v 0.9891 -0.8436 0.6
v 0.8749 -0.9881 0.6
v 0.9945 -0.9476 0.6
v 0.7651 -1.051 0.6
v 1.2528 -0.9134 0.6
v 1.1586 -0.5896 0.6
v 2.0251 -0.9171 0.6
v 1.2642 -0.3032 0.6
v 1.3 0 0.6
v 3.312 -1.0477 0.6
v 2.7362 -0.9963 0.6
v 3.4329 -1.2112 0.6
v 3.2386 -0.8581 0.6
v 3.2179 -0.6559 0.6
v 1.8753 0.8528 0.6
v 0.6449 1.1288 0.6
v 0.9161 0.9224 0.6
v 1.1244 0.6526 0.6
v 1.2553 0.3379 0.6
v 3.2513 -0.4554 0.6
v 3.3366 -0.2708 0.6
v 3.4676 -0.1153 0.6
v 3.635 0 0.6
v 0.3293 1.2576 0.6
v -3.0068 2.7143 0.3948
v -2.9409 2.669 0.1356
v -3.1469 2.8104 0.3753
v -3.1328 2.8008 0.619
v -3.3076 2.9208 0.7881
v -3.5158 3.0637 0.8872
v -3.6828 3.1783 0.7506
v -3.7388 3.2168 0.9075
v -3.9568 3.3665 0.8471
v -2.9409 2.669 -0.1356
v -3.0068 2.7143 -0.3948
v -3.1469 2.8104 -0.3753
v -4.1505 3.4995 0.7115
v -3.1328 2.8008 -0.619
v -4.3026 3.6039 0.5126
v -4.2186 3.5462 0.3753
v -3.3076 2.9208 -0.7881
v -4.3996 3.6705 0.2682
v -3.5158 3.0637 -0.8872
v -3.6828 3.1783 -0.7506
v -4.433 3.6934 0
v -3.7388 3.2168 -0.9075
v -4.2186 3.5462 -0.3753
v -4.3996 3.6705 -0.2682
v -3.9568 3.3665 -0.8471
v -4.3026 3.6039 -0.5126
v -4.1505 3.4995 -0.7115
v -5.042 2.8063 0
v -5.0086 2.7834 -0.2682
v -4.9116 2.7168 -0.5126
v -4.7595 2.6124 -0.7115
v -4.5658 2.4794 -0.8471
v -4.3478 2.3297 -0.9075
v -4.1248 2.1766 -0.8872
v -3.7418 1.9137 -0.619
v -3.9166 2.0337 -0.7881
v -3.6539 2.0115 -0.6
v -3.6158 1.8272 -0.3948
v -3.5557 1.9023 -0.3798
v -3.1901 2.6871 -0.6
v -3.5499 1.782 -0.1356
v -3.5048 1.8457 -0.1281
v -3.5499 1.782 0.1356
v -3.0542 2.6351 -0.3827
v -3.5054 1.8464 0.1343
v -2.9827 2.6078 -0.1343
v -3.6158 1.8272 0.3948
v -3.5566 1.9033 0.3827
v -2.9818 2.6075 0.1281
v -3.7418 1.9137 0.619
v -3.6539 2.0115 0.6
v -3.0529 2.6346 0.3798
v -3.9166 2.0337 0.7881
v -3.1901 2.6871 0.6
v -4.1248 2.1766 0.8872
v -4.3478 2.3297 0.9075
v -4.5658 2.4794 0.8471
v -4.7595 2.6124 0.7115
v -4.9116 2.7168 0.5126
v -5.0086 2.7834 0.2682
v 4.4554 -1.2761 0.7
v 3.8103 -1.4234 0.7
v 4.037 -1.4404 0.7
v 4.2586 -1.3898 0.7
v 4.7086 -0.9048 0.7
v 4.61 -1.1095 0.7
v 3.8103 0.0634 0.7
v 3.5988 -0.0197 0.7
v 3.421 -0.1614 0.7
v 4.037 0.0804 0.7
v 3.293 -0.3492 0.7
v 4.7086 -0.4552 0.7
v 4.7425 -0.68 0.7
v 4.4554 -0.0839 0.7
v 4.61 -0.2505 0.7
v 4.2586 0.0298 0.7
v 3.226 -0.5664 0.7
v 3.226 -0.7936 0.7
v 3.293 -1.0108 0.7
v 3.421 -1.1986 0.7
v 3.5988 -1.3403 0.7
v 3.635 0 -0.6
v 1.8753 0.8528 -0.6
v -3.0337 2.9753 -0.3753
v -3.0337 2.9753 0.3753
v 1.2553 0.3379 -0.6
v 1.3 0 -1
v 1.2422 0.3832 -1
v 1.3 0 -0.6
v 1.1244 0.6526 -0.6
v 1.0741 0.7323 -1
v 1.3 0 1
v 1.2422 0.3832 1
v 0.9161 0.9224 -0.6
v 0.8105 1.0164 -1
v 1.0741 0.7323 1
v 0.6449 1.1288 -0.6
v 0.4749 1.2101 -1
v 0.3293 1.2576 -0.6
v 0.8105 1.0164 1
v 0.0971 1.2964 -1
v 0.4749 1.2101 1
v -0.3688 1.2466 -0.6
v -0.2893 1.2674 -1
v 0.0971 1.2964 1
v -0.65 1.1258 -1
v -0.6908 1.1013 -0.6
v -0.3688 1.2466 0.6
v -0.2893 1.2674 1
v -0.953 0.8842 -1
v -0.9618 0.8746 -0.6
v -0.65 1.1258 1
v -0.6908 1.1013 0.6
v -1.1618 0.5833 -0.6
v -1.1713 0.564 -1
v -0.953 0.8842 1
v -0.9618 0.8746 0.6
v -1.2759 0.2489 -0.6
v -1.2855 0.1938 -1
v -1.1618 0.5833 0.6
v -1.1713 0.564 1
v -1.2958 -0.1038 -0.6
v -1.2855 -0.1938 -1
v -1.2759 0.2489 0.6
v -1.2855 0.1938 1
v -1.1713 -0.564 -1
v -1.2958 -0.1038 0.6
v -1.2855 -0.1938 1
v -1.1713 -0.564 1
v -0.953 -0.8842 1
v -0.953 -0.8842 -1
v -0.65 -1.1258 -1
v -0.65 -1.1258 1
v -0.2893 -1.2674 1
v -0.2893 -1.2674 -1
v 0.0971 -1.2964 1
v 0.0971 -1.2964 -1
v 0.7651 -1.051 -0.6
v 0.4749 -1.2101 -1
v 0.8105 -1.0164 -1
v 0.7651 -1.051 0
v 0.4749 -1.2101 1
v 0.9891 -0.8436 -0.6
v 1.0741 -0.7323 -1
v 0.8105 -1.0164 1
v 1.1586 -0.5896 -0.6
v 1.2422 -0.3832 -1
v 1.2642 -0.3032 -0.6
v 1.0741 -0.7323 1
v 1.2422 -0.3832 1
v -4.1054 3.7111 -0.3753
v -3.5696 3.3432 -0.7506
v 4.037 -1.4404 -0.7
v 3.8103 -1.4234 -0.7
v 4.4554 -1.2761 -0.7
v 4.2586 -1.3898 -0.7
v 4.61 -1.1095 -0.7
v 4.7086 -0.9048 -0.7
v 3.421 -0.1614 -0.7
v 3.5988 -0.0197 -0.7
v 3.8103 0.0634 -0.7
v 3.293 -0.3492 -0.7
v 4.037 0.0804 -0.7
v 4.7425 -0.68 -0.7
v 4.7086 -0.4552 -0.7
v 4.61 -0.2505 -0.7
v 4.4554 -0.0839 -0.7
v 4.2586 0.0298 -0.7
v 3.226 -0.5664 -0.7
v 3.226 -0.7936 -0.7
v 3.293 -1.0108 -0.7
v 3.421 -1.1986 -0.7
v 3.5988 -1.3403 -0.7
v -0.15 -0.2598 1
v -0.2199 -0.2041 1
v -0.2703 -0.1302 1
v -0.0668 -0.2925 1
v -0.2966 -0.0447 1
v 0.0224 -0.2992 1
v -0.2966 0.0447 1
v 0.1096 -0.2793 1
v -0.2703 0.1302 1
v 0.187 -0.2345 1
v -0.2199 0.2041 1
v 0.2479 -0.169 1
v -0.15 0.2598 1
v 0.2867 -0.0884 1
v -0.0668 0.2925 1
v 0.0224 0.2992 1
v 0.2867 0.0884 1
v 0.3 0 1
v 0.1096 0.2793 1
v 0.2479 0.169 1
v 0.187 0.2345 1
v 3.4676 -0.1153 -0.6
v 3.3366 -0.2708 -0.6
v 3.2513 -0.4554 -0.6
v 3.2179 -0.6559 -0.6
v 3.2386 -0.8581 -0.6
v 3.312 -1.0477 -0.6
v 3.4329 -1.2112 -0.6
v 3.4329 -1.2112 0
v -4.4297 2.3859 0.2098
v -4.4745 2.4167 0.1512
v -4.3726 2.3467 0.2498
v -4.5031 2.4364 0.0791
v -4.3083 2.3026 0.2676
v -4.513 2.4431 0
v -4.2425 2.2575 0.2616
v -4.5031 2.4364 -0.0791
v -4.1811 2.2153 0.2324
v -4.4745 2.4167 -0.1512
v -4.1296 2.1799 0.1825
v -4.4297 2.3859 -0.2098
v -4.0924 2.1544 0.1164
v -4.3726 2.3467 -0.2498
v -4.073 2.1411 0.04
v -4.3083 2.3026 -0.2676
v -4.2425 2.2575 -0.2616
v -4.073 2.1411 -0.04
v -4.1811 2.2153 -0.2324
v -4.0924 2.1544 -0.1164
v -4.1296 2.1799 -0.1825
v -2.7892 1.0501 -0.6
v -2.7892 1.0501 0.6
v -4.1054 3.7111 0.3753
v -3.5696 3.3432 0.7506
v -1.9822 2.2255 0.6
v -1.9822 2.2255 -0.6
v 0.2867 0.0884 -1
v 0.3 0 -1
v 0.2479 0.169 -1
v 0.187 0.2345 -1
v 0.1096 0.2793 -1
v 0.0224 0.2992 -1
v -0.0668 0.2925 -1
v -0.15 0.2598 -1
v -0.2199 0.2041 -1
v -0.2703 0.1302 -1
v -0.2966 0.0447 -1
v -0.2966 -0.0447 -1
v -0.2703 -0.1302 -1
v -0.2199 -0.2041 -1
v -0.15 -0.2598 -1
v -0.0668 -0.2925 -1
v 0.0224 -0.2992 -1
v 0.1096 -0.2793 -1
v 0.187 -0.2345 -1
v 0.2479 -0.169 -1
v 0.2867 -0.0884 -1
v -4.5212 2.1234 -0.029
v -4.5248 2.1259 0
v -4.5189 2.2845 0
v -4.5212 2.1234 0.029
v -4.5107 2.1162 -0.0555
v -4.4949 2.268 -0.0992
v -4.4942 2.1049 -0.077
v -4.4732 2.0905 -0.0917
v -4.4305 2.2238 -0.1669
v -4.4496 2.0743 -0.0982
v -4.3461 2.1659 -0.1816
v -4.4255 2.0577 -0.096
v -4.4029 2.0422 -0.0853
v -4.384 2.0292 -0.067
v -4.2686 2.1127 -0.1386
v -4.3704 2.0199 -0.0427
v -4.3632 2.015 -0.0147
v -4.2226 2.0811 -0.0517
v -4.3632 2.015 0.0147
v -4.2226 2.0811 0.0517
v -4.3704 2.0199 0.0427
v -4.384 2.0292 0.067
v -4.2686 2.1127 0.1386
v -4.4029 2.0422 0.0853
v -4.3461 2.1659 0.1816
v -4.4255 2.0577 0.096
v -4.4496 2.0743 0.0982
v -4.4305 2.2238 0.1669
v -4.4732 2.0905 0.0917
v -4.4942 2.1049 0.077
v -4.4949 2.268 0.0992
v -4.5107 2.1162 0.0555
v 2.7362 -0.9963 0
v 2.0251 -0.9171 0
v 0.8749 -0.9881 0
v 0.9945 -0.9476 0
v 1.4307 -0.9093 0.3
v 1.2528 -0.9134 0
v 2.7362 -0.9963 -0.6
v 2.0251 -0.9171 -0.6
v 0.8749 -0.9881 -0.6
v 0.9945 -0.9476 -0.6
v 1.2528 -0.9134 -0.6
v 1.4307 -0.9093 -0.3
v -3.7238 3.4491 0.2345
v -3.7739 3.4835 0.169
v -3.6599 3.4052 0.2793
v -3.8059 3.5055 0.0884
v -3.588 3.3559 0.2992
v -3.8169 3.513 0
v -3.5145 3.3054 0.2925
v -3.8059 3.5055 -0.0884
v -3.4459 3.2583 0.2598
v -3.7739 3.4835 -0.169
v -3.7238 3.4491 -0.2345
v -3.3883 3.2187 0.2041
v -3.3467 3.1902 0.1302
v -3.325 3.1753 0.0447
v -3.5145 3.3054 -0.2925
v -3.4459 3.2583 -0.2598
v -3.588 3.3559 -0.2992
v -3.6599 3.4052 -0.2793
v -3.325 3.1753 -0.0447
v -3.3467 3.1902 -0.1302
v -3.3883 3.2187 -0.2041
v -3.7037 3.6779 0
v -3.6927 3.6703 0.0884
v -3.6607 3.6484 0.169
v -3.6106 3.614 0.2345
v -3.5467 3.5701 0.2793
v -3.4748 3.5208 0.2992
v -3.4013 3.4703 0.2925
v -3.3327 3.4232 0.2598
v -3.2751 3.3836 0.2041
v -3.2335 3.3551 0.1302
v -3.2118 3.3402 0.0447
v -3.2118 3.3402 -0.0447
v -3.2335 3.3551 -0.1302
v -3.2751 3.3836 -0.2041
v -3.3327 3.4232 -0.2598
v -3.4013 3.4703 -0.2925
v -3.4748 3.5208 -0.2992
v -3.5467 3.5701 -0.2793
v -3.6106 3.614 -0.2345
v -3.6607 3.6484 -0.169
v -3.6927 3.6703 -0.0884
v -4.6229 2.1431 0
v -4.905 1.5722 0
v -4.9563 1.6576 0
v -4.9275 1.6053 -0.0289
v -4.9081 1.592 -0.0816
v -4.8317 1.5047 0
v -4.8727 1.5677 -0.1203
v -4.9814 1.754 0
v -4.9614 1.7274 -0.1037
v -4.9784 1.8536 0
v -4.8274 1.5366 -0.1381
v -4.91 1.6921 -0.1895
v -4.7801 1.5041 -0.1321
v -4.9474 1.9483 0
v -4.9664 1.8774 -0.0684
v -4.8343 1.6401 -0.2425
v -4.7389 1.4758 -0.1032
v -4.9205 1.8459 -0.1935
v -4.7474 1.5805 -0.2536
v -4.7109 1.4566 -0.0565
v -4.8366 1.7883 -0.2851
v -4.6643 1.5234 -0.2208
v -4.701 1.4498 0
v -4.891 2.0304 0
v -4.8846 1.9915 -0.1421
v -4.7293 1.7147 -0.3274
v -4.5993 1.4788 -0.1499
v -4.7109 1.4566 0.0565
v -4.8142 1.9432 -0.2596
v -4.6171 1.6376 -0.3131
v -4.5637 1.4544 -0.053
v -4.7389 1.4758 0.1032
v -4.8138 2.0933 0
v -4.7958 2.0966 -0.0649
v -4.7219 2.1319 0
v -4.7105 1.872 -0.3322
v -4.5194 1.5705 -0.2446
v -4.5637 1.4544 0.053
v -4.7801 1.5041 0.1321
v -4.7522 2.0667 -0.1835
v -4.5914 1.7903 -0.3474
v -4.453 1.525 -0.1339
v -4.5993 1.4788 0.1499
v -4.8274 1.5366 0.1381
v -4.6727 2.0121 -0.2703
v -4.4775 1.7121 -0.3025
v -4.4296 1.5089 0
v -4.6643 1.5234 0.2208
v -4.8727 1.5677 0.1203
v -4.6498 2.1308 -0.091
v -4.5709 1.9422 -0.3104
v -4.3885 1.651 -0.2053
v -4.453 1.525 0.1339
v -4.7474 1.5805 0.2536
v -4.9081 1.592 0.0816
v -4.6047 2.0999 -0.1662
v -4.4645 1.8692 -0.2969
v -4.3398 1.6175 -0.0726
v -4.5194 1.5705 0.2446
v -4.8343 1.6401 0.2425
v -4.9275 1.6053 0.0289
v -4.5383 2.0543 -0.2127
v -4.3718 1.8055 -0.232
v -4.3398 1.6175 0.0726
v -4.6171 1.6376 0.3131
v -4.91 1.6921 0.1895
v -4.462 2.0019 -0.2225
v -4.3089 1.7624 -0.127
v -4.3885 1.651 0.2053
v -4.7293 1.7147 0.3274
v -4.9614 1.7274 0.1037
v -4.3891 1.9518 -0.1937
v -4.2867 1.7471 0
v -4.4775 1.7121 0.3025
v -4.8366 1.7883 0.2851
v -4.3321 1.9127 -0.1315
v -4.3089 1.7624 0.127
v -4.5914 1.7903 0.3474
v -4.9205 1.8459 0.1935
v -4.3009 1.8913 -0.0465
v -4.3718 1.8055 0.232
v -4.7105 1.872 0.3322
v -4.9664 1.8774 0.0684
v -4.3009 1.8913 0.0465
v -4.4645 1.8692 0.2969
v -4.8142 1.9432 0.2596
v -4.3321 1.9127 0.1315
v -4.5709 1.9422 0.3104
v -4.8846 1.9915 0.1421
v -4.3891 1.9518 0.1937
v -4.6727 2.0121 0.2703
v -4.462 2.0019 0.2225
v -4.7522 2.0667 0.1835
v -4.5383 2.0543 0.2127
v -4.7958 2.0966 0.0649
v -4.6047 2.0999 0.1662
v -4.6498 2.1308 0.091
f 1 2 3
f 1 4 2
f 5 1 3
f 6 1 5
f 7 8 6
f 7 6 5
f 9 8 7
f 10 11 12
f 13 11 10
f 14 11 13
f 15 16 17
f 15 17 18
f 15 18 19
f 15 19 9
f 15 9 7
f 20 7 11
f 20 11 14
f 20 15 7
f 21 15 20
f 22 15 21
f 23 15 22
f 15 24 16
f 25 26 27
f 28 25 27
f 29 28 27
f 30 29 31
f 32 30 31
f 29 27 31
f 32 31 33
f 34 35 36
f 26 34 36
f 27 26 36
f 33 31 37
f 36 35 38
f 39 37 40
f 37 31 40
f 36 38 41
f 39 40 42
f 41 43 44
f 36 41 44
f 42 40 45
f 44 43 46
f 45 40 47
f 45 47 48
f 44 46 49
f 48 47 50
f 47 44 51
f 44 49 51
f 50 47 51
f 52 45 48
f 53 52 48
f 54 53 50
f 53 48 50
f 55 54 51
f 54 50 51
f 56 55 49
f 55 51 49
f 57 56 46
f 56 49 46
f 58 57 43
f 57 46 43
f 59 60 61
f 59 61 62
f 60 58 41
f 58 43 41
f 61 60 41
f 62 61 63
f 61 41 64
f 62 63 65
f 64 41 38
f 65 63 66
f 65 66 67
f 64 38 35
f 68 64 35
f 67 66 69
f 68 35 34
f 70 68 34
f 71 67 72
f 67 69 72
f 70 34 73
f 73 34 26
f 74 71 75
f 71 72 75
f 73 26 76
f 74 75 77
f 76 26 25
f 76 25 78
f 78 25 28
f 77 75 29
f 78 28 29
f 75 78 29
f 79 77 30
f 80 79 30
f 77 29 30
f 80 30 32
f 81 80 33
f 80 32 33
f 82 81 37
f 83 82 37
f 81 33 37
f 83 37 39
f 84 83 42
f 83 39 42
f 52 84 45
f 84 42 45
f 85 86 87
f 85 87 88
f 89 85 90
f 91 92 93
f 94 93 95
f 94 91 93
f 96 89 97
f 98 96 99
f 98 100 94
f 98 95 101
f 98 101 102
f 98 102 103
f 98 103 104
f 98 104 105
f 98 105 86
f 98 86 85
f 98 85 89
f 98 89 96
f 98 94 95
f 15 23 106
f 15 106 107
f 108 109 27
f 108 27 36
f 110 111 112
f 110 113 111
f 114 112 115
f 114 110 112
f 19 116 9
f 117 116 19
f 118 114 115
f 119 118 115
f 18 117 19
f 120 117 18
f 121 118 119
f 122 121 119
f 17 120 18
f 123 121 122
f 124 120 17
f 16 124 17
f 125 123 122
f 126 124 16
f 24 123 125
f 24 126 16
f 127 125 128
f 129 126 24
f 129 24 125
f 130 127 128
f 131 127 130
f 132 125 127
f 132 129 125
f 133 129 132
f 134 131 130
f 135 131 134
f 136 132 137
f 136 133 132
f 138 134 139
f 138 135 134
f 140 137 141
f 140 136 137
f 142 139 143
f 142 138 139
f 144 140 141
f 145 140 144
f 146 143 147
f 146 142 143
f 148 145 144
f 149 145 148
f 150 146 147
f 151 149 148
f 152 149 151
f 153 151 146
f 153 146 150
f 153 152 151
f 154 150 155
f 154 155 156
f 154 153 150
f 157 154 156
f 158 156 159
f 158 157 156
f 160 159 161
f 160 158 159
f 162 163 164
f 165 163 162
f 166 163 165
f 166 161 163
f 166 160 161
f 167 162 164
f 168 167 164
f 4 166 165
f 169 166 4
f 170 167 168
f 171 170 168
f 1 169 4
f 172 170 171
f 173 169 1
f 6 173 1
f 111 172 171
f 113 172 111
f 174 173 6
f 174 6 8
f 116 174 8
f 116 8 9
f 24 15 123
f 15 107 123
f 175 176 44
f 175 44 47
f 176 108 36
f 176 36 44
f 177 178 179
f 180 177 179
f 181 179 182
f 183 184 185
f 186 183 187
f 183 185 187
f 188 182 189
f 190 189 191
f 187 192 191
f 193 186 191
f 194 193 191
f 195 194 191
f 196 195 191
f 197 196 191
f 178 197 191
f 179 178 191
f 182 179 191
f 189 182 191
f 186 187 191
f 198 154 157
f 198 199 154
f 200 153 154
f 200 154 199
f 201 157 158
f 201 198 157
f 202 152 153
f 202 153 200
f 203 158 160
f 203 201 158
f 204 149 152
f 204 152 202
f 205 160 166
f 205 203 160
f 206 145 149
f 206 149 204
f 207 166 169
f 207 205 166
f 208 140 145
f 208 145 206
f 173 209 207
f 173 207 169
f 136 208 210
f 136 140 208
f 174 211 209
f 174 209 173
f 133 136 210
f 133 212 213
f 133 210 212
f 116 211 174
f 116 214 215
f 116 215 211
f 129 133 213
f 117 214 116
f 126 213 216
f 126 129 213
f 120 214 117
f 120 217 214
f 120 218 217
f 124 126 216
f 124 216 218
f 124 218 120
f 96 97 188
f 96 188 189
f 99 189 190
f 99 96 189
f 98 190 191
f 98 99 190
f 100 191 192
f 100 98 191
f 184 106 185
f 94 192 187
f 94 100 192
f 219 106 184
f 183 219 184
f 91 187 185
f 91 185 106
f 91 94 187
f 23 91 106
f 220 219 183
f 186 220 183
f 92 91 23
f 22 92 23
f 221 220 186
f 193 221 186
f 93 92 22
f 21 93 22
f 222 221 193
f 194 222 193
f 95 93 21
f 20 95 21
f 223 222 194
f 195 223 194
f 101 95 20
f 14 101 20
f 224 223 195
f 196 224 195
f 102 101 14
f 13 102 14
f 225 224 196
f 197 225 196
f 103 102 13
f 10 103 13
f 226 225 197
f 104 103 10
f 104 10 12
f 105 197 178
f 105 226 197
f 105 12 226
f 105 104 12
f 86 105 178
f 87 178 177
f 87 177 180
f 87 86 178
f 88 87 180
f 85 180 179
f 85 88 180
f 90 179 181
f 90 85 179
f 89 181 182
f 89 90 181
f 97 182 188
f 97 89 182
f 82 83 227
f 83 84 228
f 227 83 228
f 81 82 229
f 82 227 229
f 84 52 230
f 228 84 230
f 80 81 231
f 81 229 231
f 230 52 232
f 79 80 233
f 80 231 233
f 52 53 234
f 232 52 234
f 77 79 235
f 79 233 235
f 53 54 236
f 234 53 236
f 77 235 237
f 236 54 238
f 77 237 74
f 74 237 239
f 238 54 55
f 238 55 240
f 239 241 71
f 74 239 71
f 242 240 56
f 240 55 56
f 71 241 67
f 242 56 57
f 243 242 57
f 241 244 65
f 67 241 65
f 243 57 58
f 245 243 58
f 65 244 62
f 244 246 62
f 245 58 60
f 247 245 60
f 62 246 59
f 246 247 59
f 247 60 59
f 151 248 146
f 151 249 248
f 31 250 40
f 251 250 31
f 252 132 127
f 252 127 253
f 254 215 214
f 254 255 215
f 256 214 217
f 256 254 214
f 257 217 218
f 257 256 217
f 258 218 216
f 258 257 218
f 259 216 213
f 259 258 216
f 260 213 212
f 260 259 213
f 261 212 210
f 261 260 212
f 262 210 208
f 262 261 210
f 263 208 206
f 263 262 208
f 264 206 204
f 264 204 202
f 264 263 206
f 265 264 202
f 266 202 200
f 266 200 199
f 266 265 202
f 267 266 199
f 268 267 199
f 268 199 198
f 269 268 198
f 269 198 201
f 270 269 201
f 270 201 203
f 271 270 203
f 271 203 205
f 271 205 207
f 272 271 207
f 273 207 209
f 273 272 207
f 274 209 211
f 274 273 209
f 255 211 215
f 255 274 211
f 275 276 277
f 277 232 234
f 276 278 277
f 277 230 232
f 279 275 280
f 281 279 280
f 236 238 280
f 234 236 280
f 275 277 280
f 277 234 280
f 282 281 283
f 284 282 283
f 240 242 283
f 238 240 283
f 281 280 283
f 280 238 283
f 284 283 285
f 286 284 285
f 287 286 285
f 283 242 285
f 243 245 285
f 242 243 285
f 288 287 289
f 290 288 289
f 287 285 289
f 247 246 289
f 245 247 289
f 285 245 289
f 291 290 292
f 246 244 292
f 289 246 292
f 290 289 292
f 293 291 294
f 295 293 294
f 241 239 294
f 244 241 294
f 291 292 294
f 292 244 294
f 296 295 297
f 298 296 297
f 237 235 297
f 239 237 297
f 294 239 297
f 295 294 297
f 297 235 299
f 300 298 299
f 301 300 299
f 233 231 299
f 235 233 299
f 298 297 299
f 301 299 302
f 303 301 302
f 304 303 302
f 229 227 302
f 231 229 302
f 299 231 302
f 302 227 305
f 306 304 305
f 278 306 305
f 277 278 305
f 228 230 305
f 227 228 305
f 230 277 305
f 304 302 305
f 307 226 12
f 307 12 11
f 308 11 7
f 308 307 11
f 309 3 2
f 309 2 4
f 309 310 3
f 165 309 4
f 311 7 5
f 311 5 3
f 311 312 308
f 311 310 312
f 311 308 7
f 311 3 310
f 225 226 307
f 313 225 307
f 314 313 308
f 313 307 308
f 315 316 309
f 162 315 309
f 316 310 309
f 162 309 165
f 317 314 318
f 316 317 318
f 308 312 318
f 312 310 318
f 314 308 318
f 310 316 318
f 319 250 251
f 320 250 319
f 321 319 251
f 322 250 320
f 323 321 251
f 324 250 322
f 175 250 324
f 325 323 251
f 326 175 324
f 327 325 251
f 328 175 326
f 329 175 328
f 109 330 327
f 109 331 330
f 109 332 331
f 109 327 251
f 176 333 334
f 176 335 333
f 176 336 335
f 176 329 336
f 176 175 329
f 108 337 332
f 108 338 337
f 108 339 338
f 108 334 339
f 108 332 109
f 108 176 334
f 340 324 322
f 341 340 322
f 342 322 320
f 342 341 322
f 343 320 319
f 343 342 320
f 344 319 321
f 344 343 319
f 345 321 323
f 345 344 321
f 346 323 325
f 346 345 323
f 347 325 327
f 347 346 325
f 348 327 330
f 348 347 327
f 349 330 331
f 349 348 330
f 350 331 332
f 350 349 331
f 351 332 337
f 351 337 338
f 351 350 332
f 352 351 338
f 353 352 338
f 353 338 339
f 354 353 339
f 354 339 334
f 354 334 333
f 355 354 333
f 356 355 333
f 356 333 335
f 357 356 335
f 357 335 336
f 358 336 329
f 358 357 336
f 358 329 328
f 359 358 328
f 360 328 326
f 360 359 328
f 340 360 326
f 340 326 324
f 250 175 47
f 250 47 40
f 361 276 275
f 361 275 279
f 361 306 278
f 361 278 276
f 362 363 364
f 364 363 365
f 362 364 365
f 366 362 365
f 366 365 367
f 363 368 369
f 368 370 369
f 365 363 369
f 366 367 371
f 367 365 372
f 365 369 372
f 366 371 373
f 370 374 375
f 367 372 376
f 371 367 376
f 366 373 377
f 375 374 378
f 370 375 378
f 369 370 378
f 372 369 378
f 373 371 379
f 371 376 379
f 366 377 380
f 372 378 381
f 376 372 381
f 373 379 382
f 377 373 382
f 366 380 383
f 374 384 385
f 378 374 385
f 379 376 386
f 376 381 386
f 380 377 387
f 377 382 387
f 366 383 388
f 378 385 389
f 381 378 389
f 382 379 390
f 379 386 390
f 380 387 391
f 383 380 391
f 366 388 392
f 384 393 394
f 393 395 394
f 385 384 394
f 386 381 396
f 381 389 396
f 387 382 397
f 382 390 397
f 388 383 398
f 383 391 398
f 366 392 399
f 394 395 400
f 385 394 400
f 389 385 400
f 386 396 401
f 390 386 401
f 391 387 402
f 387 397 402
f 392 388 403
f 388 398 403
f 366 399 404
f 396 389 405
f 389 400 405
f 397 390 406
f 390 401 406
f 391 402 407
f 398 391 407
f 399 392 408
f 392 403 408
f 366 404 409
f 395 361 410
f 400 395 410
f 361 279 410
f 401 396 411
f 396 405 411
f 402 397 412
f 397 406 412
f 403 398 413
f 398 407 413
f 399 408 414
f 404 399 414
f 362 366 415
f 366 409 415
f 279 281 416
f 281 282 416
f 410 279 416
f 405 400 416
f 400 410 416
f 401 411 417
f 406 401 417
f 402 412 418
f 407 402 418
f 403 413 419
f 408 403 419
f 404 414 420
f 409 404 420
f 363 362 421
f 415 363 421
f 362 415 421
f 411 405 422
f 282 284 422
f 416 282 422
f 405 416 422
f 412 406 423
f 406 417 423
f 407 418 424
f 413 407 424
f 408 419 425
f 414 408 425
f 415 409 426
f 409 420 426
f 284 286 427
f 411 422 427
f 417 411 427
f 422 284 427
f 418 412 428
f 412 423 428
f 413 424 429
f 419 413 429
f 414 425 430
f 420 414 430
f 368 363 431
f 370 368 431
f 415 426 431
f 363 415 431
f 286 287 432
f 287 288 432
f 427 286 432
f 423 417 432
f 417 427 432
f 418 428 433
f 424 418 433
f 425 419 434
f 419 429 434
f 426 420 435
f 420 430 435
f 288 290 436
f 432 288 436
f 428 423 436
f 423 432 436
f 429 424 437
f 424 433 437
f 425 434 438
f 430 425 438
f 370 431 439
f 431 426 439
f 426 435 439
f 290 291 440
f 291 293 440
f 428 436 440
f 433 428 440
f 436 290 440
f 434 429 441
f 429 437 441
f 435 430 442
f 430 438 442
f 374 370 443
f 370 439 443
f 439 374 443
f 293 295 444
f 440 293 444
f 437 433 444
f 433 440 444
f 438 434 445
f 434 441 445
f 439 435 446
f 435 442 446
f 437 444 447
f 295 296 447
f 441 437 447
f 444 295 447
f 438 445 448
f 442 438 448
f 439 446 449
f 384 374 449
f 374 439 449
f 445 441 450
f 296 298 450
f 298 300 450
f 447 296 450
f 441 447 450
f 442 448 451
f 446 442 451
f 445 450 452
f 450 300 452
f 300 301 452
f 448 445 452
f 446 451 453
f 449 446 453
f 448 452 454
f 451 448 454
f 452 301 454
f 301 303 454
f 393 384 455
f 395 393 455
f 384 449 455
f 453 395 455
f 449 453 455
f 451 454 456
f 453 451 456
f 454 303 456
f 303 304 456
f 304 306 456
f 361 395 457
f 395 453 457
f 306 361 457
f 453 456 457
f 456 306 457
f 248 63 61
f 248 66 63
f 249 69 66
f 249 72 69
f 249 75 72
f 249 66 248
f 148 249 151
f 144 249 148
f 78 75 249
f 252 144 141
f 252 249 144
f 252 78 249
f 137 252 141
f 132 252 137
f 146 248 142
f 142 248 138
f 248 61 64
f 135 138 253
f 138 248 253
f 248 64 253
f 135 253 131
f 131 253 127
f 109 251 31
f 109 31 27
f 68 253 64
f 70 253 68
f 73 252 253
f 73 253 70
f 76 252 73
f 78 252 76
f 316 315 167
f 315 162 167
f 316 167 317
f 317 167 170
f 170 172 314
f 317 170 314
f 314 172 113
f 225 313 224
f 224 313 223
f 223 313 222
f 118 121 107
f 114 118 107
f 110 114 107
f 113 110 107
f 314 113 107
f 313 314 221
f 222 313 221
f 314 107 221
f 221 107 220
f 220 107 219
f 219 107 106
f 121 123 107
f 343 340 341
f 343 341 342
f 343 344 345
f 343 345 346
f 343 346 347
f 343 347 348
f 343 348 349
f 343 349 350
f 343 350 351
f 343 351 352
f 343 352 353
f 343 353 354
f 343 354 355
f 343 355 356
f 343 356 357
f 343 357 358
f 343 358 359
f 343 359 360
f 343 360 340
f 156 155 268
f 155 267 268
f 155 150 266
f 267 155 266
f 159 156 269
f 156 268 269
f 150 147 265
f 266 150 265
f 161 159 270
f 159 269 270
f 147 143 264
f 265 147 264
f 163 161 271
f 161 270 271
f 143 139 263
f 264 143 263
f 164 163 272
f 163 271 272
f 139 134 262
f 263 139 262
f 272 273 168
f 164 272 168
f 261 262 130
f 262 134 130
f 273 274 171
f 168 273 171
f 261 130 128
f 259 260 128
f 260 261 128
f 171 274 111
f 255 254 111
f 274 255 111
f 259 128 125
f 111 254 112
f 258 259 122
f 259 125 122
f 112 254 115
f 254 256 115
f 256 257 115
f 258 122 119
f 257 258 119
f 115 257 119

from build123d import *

# Parameters (mm, degrees)
SKETCH1_R           = 0.3
BOSS_EXTRUDE1_DEPTH = 1
BOSS_EXTRUDE2_DEPTH = 0.7
BOSS_EXTRUDE3_DEPTH = 0.6
BOSS_EXTRUDE4_DEPTH = 0.6
BOSS_EXTRUDE5_DEPTH = 0.2
SKETCH5_R           = 0.3
BOSS_EXTRUDE6_DEPTH = 0.2


with BuildPart() as part:
    # Sketch1 → Boss-Extrude1 (new, symmetric)
    with BuildSketch(Plane.XY):
        with BuildLine():
            ThreePointArc((1.3, 0), (1.02910885, 0.794314153), (0.329330809, 1.257593423))
            ThreePointArc((0.329330809, 1.257593423), (-0.020477848, 1.299838705), (-0.368782161, 1.24659525))
            ThreePointArc((-0.368782161, 1.24659525), (-1.071749439, 0.735767042), (-1.295848634, -0.103809043))
            ThreePointArc((-1.295848634, -0.103809043), (-0.542880941, -1.181219829), (0.765101997, -1.051008532))
            ThreePointArc((0.765101997, -1.051008532), (1.158583747, -0.5896471), (1.3, 0))
        make_face()
        Circle(SKETCH1_R, mode=Mode.SUBTRACT)
    extrude(amount=BOSS_EXTRUDE1_DEPTH, both=True)



with BuildPart() as body_2:
    # Sketch1<3> → Boss-Extrude2 (new, symmetric)
    with BuildSketch(Plane.XY):
        with BuildLine():
            ThreePointArc((4.7425, -0.68), (4.378976485, -0.030212331), (3.635027175, 0))
            ThreePointArc((3.635027175, 0), (3.227898468, -0.554502849), (3.432931907, -1.211152286))
            ThreePointArc((3.432931907, -1.211152286), (4.266589278, -1.386592411), (4.7425, -0.68))
        make_face()
    extrude(amount=BOSS_EXTRUDE2_DEPTH, both=True)


with BuildPart() as part_1:
    add(part.part)

    add(body_2.part)  # Boss-Extrude3 merges body 2
    # Sketch1<4> → Boss-Extrude3 (add, symmetric)
    with BuildSketch(Plane.XY):
        with BuildLine():
            ThreePointArc((3.432931907, -1.211152286), (3.227898468, -0.554502849), (3.635027175, 0))
            Line((3.635027175, 0), (1.875255399, 0.852756227))
            Line((1.875255399, 0.852756227), (0.329330809, 1.257593423))
            ThreePointArc((0.329330809, 1.257593423), (1.02910885, 0.794314153), (1.3, 0))
            ThreePointArc((1.3, 0), (1.158583747, -0.5896471), (0.765101997, -1.051008532))
            add(Edge.make_bspline(
                [(3.432931907, -1.211152286), (2.782696134, -0.927463912), (1.92467005, -0.895659575), (0.949941147, -0.916451296), (0.765101997, -1.051008532)],
                knots=[0, 0, 0, 0, 0.749641012, 1, 1, 1, 1], degree=3))
        make_face()
    extrude(amount=BOSS_EXTRUDE3_DEPTH, both=True)

    # Sketch1<5> → Boss-Extrude4 (add, symmetric)
    with BuildSketch(Plane.XY):
        with BuildLine():
            ThreePointArc((-1.295848634, -0.103809043), (-1.071749439, 0.735767042), (-0.368782161, 1.24659525))
            Line((-0.368782161, 1.24659525), (-1.982194984, 2.225541153))
            Line((-1.982194984, 2.225541153), (-3.468005165, 2.793231136))
            Line((-3.468005165, 2.793231136), (-3.852867925, 2.232623737))
            Line((-3.852867925, 2.232623737), (-2.789177956, 1.050055575))
            Line((-2.789177956, 1.050055575), (-1.295848634, -0.103809043))
        make_face()
    extrude(amount=BOSS_EXTRUDE4_DEPTH, both=True)



with BuildPart() as body_2_2:
    # Sketch2 → Revolve1 (revolve)
    with BuildSketch(Plane.XY):
        with BuildLine():
            Line((-3.852867925, 2.232623737), (-3.445366179, 2.826208042))
            Line((-3.445366179, 2.826208042), (-3.771013124, 3.049768027))
            Line((-3.771013124, 3.049768027), (-4.831729785, 1.50468321))
            ThreePointArc((-4.831729785, 1.50468321), (-4.376188277, 1.556125039), (-4.362335635, 2.014352527))
            Line((-4.362335635, 2.014352527), (-3.852867925, 2.232623737))
        make_face()
    revolve(axis=Axis((-3.771013124, 3.049768027, 0), (-0.5659746478395028, -0.8244226452511788, 0)))


with BuildPart() as part_2:
    add(part_1.part)

    add(body_2_2.part)  # Revolve2 merges body 2 2
    # Sketch3 → Revolve2 (revolve)
    with BuildSketch(Plane.XY):
        Polygon((-3.682752686, 3.178331919), (-4.291741407, 2.291253153), (-5.041966015, 2.806290082), (-4.432977294, 3.693368848), align=None)
    revolve(axis=Axis((-3.682752686, 3.178331919, 0), (-0.5659746478395036, -0.8244226452511781, 0)))

    # Sketch4 → Boss-Extrude5 (add, symmetric)
    with BuildSketch(Plane(origin=(0.303330803, 0.441844497, 0), x_dir=(0.824422645251178, -0.5659746478395038, 0), z_dir=(0.5659746478395038, 0.824422645251178, 0))):
        Polygon((-4.835, 0.75055535), (-5.485, 0.375277675), (-5.485, -0.375277675), (-4.835, -0.75055535), (-4.185, -0.375277675), (-4.185, 0.375277675), align=None)
    extrude(amount=BOSS_EXTRUDE5_DEPTH, both=True)

    # Sketch5 → Boss-Extrude6 (add, symmetric)
    with BuildSketch(Plane(origin=(0.416525733, 0.606729026, 0), x_dir=(0.8244226452511778, -0.5659746478395041, 0), z_dir=(0.565974647839504, 0.8244226452511777, 0))):
        with Locations((-4.835, 0)):
            Circle(SKETCH5_R)
    extrude(amount=BOSS_EXTRUDE6_DEPTH, both=True)


solid = part_2.part
